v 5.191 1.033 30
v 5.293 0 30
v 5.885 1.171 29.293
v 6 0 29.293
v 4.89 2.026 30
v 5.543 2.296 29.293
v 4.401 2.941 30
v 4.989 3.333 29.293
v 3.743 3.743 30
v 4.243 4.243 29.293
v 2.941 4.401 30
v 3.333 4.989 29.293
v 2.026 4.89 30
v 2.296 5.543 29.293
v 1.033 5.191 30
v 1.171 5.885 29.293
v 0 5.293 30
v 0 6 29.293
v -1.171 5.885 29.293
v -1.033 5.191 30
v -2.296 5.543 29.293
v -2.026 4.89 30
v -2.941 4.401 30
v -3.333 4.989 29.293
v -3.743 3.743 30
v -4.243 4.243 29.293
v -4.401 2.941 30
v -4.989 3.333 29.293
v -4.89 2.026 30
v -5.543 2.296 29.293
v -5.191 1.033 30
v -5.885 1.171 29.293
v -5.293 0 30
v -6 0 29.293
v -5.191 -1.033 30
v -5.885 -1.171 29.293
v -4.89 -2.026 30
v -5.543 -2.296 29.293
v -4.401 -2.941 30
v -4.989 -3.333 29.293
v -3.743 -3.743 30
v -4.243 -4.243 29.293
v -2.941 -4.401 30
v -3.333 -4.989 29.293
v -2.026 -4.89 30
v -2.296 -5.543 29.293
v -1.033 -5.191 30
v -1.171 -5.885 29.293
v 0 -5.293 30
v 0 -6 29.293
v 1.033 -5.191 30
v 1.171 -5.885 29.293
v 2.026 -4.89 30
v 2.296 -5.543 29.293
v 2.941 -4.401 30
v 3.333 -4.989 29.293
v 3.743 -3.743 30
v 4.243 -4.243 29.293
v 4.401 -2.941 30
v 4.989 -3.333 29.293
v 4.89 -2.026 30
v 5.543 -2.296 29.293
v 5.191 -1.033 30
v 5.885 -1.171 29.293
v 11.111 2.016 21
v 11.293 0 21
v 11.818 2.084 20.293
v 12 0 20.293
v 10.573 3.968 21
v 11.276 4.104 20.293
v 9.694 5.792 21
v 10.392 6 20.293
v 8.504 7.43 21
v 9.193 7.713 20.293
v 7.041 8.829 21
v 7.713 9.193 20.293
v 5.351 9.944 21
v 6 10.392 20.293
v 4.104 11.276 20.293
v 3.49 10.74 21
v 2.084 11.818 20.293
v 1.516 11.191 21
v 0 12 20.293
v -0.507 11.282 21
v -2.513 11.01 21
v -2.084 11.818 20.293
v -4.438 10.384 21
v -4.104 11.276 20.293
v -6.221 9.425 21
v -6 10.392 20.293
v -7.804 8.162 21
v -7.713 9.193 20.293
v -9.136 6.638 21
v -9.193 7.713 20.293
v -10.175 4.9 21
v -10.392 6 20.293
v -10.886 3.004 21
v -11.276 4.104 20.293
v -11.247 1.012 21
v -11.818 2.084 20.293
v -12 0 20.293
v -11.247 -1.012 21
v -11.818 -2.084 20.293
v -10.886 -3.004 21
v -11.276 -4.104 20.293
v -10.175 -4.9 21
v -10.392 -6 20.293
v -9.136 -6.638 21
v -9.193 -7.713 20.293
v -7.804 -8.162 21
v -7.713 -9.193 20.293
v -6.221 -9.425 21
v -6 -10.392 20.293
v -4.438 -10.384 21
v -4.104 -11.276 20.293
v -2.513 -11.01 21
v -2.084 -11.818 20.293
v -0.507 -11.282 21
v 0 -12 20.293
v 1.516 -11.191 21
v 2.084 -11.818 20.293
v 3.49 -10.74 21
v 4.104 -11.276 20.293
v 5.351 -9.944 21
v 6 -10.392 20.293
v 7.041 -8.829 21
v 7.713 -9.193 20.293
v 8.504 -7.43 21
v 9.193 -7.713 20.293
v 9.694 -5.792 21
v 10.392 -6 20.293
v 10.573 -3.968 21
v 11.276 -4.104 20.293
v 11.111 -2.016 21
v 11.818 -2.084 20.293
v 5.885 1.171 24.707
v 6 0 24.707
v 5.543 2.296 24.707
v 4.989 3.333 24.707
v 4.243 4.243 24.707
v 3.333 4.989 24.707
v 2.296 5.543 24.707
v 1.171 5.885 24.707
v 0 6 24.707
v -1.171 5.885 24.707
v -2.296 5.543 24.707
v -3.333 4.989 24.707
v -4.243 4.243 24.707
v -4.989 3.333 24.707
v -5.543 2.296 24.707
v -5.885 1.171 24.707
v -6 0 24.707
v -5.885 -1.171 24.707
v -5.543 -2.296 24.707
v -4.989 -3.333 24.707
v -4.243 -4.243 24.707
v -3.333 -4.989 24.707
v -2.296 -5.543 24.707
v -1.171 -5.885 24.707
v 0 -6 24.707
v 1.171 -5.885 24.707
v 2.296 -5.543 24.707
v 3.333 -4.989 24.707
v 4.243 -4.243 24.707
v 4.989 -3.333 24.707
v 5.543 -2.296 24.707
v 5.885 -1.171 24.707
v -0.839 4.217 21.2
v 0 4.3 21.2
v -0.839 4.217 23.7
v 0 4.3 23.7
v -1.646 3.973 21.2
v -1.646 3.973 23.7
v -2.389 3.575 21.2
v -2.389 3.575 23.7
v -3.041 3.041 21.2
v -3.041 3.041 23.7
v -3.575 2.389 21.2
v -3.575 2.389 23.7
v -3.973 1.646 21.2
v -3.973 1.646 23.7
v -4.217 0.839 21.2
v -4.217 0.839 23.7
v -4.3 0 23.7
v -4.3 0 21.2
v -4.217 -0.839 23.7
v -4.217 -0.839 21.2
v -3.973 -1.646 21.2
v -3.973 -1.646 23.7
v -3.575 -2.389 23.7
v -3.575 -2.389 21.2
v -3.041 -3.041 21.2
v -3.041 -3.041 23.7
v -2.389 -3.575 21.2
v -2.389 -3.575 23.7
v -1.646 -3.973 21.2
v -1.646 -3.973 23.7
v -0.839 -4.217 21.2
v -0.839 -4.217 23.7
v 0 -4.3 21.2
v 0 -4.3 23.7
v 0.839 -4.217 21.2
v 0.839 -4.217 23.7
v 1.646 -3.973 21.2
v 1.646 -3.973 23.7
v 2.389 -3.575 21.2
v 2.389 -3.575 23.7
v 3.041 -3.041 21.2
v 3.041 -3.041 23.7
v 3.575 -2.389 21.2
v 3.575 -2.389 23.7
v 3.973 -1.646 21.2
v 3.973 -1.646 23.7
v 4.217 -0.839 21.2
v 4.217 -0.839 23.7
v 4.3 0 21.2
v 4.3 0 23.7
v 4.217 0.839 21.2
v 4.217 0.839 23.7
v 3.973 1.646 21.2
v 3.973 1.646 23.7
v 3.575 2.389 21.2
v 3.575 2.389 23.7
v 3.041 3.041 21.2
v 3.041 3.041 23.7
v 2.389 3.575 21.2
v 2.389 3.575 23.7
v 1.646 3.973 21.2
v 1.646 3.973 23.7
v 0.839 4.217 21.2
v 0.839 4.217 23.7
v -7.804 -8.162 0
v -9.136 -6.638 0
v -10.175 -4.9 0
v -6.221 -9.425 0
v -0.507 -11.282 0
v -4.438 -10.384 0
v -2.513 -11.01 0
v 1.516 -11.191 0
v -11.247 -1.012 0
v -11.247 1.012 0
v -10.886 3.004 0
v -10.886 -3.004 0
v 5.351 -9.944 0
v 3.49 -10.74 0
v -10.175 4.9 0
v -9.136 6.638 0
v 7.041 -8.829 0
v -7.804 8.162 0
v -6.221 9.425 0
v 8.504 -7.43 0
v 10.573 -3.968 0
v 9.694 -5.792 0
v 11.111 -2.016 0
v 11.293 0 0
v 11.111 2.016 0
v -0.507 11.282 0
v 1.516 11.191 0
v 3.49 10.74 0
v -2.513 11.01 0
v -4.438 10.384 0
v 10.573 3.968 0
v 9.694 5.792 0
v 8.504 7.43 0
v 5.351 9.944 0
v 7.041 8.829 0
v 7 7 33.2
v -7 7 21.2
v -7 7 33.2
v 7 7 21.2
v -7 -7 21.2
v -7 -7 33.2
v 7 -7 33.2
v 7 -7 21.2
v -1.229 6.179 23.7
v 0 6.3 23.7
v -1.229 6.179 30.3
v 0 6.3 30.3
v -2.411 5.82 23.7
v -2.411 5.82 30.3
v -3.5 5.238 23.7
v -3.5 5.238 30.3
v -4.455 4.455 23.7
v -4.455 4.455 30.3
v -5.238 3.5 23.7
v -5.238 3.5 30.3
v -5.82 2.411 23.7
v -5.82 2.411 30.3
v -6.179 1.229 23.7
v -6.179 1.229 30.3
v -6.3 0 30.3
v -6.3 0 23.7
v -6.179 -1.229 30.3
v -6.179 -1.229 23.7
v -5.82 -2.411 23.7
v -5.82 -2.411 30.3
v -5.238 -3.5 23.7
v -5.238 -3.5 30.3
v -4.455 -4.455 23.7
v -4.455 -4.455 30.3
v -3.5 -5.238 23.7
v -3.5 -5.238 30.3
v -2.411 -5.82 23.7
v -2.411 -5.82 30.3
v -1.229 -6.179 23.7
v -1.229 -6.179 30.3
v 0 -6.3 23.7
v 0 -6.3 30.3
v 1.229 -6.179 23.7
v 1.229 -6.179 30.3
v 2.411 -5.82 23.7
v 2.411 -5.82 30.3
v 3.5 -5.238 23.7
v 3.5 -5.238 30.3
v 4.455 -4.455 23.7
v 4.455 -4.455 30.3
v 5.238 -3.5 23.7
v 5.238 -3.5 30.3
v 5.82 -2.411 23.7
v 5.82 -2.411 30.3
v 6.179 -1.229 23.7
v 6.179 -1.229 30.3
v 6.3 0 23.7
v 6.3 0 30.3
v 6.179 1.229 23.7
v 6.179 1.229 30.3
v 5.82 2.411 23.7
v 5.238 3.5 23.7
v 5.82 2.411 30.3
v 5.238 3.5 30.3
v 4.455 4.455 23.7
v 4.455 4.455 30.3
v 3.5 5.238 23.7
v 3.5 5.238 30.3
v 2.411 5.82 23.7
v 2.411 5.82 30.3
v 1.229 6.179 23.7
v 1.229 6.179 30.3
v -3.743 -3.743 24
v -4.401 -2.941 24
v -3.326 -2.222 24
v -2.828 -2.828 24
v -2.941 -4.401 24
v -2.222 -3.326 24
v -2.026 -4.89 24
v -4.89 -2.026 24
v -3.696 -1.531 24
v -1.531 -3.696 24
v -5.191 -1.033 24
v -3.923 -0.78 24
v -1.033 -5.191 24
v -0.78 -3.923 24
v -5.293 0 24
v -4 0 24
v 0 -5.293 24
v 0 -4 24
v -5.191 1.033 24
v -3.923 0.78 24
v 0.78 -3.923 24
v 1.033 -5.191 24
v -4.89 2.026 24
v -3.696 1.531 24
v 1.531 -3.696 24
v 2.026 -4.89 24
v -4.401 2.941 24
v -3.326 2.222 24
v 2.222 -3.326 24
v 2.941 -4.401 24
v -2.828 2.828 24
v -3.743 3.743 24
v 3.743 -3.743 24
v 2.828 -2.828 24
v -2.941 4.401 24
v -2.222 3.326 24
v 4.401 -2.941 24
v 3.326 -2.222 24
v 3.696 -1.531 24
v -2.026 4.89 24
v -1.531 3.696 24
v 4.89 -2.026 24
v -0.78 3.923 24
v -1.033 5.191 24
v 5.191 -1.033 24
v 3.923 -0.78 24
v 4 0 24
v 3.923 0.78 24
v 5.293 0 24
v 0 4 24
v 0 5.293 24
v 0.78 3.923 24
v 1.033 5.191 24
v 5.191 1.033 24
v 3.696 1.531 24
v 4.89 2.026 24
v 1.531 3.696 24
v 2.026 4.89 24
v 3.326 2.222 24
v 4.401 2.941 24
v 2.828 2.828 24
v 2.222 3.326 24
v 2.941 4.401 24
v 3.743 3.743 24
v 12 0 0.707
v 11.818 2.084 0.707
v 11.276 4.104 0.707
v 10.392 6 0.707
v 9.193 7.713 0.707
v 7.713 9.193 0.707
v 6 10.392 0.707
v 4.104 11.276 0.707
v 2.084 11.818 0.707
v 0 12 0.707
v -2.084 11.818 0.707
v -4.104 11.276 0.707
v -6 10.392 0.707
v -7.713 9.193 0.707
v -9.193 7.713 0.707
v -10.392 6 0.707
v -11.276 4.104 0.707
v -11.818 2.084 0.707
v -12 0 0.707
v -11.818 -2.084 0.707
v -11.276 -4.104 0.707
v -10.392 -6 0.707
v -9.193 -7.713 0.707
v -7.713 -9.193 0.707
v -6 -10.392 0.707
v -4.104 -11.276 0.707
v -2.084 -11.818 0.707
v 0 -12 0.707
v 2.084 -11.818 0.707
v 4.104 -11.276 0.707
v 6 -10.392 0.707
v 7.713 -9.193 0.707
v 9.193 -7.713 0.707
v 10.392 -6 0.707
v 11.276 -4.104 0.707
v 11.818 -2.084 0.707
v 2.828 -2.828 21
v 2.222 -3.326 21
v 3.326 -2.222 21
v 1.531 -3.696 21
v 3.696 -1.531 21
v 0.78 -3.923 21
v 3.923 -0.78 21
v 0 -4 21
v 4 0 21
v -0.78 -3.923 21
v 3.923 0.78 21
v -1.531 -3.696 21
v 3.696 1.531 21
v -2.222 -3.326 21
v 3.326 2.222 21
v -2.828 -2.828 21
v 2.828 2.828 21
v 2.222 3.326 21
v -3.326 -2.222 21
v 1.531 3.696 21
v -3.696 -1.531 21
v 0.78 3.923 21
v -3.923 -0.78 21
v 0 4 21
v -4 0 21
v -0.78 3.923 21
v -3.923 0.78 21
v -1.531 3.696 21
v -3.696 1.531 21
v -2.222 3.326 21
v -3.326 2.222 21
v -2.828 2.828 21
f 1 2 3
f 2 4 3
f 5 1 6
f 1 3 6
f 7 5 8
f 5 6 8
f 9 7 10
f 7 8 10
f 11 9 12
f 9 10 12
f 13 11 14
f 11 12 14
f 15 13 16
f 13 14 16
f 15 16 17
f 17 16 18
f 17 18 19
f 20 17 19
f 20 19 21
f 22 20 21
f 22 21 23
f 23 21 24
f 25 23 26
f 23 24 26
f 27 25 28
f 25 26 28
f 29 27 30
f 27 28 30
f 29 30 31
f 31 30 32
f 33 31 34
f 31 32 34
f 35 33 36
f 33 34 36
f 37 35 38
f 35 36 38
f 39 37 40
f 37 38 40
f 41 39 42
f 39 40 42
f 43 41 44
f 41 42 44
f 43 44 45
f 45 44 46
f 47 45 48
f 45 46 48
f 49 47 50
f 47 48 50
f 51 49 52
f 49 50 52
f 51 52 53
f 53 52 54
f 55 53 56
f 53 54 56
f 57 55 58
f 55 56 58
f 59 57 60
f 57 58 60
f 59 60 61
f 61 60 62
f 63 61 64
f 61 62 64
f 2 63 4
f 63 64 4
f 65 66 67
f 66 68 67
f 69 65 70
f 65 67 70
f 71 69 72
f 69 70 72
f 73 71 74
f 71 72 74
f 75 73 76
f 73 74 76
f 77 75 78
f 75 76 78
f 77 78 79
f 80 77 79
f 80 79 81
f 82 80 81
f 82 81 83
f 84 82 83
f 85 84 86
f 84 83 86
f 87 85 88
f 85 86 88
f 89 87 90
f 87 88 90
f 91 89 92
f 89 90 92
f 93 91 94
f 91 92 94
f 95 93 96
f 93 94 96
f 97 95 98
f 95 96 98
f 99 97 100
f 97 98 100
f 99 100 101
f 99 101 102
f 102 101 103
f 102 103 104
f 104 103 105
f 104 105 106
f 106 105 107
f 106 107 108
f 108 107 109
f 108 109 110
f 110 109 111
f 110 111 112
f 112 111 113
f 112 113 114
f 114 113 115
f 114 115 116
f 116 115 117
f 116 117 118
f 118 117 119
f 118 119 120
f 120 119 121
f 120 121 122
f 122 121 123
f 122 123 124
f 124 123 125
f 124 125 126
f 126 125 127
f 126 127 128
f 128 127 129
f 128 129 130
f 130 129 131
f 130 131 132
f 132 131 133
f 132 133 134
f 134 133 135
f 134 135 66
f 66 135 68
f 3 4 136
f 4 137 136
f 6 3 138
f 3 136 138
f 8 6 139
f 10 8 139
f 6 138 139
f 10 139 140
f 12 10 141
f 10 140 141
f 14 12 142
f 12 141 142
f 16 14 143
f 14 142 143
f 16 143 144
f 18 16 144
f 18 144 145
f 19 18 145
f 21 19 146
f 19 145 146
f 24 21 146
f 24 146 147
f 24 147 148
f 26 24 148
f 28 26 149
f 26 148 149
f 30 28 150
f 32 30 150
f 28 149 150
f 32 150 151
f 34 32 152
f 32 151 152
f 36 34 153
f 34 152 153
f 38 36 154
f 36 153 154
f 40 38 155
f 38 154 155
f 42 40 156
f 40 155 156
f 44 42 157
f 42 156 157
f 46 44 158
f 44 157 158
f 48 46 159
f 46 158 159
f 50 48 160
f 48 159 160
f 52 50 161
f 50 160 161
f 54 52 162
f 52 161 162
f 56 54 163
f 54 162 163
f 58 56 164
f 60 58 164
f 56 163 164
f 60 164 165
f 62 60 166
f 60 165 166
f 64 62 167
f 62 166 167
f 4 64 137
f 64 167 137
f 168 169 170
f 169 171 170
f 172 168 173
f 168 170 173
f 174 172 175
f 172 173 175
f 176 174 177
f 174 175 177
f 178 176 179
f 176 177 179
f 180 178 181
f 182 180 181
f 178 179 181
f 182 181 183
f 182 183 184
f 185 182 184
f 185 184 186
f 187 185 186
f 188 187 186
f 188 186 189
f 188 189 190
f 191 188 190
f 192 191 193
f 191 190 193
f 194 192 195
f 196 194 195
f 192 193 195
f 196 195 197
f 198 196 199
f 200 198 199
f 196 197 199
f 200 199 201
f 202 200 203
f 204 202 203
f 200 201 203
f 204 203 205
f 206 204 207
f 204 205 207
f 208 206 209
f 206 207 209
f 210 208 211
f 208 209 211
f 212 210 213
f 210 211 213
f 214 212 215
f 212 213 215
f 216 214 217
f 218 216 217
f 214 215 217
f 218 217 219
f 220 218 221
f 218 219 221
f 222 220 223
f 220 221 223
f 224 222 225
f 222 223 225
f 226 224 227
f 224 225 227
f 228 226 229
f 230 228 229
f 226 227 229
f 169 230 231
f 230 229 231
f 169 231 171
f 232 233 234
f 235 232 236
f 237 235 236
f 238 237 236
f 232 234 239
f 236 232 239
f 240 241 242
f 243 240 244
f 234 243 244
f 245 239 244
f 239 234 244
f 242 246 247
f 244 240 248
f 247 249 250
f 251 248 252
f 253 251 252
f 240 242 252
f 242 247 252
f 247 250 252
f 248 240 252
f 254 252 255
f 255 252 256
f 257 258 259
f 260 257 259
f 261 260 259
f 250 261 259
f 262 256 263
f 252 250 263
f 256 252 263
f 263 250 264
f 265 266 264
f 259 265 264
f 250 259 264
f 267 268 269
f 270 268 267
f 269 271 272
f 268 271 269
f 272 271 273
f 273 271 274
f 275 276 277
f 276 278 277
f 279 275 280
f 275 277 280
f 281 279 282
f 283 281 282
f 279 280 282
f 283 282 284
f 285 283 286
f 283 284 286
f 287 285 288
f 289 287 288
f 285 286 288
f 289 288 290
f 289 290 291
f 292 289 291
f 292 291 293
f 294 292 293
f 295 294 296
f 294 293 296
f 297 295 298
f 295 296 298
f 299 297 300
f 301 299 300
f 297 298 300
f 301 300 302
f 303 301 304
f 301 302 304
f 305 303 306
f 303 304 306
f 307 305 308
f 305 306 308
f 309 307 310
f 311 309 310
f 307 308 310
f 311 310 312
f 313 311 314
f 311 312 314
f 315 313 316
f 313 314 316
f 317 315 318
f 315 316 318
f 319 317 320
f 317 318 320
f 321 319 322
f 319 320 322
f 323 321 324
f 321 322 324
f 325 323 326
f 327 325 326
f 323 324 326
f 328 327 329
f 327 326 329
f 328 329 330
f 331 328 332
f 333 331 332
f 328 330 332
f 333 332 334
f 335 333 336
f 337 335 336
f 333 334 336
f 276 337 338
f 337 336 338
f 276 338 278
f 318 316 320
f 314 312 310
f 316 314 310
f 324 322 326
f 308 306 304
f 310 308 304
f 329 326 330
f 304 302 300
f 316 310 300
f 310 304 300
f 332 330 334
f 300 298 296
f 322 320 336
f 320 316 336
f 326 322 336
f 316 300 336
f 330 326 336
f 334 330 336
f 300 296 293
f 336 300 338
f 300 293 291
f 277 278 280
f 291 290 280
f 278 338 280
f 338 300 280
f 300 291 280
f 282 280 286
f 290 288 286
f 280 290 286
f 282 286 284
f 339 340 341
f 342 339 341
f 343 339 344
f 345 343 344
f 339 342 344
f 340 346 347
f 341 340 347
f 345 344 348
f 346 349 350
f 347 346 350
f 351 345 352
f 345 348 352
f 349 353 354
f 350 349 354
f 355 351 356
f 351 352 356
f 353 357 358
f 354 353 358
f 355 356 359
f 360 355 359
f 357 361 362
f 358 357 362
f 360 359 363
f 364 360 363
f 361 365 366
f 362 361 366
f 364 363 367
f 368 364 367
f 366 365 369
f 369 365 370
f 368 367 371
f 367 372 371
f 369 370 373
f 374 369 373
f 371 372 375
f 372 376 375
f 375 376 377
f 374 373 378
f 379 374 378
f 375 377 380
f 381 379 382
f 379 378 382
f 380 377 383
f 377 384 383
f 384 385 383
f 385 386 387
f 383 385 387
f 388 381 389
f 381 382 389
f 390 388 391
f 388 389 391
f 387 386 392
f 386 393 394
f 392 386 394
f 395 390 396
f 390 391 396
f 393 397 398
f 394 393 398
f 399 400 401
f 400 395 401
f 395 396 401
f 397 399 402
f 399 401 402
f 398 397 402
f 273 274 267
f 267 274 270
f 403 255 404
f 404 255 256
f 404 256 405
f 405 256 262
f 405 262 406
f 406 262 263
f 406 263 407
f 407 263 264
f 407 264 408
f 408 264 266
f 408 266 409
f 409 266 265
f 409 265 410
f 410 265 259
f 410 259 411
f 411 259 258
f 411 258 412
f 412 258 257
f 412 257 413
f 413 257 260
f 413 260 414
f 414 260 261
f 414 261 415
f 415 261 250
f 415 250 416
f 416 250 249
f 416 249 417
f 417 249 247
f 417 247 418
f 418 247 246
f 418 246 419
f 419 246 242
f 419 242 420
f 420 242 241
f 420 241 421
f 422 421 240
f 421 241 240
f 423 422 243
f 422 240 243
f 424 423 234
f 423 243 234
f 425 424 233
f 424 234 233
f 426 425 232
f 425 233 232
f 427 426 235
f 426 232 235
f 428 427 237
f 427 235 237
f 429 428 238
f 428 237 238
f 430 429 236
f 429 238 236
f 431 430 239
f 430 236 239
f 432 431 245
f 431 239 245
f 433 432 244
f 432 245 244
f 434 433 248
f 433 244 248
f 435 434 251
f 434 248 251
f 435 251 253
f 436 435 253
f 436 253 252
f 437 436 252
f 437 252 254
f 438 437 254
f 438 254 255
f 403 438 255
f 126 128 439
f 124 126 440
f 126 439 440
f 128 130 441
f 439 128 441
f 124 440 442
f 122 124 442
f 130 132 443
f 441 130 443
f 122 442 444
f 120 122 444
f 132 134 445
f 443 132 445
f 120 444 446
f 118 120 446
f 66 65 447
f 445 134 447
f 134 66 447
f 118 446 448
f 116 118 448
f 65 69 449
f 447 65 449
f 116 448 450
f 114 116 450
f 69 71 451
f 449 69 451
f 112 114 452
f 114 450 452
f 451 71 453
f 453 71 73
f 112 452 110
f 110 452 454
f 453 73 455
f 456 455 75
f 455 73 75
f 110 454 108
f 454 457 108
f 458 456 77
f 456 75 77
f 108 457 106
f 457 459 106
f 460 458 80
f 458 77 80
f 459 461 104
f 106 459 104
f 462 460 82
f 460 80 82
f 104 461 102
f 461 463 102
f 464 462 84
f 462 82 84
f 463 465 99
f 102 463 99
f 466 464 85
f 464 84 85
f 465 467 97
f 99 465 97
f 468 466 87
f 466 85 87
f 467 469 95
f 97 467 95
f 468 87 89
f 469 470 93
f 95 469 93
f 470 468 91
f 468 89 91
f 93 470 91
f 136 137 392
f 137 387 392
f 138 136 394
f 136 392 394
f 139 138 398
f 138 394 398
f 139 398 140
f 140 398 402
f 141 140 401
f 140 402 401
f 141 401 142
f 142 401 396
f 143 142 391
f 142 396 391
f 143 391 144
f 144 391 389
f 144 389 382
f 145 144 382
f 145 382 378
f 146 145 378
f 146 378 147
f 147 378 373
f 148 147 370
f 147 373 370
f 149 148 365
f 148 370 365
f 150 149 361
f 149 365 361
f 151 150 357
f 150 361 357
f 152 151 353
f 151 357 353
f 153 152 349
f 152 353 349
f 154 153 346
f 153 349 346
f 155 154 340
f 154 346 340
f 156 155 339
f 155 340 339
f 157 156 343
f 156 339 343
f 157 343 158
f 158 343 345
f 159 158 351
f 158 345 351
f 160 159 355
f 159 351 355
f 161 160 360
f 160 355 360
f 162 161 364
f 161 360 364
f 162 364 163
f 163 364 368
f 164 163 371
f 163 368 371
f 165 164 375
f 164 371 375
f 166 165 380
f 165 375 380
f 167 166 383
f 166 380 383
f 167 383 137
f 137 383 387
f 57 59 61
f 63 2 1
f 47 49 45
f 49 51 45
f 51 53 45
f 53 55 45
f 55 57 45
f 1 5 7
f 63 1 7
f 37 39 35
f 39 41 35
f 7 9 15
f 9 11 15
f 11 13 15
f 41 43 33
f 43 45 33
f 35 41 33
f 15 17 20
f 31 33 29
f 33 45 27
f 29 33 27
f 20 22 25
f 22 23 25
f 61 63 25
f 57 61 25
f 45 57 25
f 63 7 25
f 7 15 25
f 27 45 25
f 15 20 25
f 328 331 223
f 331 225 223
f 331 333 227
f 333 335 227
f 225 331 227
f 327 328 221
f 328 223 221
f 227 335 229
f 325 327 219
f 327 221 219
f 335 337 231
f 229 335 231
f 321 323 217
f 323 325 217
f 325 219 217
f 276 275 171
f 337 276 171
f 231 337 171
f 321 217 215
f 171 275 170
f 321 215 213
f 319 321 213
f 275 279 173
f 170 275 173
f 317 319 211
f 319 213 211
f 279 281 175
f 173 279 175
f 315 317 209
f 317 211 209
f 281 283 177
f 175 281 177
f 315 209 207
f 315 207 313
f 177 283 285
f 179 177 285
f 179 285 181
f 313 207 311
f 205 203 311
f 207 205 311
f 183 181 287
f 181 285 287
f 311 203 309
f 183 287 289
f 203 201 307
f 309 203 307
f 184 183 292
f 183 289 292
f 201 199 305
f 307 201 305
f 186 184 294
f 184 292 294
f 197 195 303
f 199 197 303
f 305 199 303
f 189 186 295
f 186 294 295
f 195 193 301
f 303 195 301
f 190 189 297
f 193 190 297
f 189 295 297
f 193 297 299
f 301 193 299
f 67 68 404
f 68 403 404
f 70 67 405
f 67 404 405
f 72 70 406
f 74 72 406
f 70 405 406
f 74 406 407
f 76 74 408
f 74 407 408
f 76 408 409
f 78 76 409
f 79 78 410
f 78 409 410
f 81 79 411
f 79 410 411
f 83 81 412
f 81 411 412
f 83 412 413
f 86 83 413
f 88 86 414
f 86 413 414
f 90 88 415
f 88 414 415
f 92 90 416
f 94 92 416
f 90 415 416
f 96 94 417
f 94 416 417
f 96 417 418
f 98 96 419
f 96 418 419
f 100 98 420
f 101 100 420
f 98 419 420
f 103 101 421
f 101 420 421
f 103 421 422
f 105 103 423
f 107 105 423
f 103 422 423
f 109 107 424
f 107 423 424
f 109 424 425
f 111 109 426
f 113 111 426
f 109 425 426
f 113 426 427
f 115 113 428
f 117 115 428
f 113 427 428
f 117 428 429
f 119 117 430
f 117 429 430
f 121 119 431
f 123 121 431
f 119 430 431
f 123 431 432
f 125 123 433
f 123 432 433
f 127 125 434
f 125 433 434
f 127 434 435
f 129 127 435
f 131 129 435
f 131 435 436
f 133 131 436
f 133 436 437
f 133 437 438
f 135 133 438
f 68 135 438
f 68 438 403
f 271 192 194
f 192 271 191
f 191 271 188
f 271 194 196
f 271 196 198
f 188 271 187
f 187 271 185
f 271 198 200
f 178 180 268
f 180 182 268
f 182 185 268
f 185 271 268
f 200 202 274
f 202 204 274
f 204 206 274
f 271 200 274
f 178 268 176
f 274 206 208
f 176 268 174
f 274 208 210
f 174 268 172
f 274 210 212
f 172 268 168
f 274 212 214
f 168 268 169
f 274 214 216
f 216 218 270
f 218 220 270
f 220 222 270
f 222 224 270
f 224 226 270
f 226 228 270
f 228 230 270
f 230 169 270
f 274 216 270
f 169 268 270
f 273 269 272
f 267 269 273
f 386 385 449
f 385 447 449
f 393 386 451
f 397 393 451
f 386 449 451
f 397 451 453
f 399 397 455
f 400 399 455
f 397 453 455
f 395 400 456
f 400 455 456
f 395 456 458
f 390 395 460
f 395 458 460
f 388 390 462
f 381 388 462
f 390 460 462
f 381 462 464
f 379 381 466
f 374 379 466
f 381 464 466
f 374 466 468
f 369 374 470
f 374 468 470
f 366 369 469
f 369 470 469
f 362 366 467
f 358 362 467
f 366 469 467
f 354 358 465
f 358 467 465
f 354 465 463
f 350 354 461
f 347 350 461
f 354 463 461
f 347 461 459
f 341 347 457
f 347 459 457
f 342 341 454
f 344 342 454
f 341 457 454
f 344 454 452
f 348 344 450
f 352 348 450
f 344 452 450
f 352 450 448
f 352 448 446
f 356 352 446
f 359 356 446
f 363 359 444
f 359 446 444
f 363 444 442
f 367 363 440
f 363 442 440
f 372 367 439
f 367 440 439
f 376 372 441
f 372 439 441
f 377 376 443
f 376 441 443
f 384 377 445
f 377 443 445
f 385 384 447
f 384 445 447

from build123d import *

# Parameters (mm, degrees)
SKETCH001_W = 14
SKETCH001_H = 14
PAD_DEPTH   = 12


with BuildPart() as corps:
    # Sketch (on XZ_Plane of Origin) → Revolution (revolve)
    with BuildSketch(Plane.XZ):
        Polygon((0, 30), (5.292893, 30), (6, 29.292893), (6, 24.707107), (5.292893, 24), (4, 24), (4, 21), (11.292893, 21), (12, 20.292893), (12, 0.707107), (11.292893, 0), (0, 0), align=None)
    revolve(axis=Axis((0, 0, 0), (0, 0, 1)))


with BuildPart() as corps001:
    # Sketch001 (on Face7 of Binder) → Pad (new body)
    with BuildSketch(Plane.XY.offset(21.2)):
        Rectangle(SKETCH001_W, SKETCH001_H)
    extrude(amount=PAD_DEPTH)

    # Sketch002 (on YZ_Plane001 of Origin002) → Groove (revolve, cut)
    with BuildSketch(Plane.YZ):
        Polygon((0, 30.3), (0, 21.2), (4.3, 21.2), (4.3, 23.7), (6.3, 23.7), (6.3, 30.3), align=None)
    revolve(axis=Axis((0, 0, 0), (0, 0, 1)), mode=Mode.SUBTRACT)


solid = Compound([corps.part, corps001.part])
